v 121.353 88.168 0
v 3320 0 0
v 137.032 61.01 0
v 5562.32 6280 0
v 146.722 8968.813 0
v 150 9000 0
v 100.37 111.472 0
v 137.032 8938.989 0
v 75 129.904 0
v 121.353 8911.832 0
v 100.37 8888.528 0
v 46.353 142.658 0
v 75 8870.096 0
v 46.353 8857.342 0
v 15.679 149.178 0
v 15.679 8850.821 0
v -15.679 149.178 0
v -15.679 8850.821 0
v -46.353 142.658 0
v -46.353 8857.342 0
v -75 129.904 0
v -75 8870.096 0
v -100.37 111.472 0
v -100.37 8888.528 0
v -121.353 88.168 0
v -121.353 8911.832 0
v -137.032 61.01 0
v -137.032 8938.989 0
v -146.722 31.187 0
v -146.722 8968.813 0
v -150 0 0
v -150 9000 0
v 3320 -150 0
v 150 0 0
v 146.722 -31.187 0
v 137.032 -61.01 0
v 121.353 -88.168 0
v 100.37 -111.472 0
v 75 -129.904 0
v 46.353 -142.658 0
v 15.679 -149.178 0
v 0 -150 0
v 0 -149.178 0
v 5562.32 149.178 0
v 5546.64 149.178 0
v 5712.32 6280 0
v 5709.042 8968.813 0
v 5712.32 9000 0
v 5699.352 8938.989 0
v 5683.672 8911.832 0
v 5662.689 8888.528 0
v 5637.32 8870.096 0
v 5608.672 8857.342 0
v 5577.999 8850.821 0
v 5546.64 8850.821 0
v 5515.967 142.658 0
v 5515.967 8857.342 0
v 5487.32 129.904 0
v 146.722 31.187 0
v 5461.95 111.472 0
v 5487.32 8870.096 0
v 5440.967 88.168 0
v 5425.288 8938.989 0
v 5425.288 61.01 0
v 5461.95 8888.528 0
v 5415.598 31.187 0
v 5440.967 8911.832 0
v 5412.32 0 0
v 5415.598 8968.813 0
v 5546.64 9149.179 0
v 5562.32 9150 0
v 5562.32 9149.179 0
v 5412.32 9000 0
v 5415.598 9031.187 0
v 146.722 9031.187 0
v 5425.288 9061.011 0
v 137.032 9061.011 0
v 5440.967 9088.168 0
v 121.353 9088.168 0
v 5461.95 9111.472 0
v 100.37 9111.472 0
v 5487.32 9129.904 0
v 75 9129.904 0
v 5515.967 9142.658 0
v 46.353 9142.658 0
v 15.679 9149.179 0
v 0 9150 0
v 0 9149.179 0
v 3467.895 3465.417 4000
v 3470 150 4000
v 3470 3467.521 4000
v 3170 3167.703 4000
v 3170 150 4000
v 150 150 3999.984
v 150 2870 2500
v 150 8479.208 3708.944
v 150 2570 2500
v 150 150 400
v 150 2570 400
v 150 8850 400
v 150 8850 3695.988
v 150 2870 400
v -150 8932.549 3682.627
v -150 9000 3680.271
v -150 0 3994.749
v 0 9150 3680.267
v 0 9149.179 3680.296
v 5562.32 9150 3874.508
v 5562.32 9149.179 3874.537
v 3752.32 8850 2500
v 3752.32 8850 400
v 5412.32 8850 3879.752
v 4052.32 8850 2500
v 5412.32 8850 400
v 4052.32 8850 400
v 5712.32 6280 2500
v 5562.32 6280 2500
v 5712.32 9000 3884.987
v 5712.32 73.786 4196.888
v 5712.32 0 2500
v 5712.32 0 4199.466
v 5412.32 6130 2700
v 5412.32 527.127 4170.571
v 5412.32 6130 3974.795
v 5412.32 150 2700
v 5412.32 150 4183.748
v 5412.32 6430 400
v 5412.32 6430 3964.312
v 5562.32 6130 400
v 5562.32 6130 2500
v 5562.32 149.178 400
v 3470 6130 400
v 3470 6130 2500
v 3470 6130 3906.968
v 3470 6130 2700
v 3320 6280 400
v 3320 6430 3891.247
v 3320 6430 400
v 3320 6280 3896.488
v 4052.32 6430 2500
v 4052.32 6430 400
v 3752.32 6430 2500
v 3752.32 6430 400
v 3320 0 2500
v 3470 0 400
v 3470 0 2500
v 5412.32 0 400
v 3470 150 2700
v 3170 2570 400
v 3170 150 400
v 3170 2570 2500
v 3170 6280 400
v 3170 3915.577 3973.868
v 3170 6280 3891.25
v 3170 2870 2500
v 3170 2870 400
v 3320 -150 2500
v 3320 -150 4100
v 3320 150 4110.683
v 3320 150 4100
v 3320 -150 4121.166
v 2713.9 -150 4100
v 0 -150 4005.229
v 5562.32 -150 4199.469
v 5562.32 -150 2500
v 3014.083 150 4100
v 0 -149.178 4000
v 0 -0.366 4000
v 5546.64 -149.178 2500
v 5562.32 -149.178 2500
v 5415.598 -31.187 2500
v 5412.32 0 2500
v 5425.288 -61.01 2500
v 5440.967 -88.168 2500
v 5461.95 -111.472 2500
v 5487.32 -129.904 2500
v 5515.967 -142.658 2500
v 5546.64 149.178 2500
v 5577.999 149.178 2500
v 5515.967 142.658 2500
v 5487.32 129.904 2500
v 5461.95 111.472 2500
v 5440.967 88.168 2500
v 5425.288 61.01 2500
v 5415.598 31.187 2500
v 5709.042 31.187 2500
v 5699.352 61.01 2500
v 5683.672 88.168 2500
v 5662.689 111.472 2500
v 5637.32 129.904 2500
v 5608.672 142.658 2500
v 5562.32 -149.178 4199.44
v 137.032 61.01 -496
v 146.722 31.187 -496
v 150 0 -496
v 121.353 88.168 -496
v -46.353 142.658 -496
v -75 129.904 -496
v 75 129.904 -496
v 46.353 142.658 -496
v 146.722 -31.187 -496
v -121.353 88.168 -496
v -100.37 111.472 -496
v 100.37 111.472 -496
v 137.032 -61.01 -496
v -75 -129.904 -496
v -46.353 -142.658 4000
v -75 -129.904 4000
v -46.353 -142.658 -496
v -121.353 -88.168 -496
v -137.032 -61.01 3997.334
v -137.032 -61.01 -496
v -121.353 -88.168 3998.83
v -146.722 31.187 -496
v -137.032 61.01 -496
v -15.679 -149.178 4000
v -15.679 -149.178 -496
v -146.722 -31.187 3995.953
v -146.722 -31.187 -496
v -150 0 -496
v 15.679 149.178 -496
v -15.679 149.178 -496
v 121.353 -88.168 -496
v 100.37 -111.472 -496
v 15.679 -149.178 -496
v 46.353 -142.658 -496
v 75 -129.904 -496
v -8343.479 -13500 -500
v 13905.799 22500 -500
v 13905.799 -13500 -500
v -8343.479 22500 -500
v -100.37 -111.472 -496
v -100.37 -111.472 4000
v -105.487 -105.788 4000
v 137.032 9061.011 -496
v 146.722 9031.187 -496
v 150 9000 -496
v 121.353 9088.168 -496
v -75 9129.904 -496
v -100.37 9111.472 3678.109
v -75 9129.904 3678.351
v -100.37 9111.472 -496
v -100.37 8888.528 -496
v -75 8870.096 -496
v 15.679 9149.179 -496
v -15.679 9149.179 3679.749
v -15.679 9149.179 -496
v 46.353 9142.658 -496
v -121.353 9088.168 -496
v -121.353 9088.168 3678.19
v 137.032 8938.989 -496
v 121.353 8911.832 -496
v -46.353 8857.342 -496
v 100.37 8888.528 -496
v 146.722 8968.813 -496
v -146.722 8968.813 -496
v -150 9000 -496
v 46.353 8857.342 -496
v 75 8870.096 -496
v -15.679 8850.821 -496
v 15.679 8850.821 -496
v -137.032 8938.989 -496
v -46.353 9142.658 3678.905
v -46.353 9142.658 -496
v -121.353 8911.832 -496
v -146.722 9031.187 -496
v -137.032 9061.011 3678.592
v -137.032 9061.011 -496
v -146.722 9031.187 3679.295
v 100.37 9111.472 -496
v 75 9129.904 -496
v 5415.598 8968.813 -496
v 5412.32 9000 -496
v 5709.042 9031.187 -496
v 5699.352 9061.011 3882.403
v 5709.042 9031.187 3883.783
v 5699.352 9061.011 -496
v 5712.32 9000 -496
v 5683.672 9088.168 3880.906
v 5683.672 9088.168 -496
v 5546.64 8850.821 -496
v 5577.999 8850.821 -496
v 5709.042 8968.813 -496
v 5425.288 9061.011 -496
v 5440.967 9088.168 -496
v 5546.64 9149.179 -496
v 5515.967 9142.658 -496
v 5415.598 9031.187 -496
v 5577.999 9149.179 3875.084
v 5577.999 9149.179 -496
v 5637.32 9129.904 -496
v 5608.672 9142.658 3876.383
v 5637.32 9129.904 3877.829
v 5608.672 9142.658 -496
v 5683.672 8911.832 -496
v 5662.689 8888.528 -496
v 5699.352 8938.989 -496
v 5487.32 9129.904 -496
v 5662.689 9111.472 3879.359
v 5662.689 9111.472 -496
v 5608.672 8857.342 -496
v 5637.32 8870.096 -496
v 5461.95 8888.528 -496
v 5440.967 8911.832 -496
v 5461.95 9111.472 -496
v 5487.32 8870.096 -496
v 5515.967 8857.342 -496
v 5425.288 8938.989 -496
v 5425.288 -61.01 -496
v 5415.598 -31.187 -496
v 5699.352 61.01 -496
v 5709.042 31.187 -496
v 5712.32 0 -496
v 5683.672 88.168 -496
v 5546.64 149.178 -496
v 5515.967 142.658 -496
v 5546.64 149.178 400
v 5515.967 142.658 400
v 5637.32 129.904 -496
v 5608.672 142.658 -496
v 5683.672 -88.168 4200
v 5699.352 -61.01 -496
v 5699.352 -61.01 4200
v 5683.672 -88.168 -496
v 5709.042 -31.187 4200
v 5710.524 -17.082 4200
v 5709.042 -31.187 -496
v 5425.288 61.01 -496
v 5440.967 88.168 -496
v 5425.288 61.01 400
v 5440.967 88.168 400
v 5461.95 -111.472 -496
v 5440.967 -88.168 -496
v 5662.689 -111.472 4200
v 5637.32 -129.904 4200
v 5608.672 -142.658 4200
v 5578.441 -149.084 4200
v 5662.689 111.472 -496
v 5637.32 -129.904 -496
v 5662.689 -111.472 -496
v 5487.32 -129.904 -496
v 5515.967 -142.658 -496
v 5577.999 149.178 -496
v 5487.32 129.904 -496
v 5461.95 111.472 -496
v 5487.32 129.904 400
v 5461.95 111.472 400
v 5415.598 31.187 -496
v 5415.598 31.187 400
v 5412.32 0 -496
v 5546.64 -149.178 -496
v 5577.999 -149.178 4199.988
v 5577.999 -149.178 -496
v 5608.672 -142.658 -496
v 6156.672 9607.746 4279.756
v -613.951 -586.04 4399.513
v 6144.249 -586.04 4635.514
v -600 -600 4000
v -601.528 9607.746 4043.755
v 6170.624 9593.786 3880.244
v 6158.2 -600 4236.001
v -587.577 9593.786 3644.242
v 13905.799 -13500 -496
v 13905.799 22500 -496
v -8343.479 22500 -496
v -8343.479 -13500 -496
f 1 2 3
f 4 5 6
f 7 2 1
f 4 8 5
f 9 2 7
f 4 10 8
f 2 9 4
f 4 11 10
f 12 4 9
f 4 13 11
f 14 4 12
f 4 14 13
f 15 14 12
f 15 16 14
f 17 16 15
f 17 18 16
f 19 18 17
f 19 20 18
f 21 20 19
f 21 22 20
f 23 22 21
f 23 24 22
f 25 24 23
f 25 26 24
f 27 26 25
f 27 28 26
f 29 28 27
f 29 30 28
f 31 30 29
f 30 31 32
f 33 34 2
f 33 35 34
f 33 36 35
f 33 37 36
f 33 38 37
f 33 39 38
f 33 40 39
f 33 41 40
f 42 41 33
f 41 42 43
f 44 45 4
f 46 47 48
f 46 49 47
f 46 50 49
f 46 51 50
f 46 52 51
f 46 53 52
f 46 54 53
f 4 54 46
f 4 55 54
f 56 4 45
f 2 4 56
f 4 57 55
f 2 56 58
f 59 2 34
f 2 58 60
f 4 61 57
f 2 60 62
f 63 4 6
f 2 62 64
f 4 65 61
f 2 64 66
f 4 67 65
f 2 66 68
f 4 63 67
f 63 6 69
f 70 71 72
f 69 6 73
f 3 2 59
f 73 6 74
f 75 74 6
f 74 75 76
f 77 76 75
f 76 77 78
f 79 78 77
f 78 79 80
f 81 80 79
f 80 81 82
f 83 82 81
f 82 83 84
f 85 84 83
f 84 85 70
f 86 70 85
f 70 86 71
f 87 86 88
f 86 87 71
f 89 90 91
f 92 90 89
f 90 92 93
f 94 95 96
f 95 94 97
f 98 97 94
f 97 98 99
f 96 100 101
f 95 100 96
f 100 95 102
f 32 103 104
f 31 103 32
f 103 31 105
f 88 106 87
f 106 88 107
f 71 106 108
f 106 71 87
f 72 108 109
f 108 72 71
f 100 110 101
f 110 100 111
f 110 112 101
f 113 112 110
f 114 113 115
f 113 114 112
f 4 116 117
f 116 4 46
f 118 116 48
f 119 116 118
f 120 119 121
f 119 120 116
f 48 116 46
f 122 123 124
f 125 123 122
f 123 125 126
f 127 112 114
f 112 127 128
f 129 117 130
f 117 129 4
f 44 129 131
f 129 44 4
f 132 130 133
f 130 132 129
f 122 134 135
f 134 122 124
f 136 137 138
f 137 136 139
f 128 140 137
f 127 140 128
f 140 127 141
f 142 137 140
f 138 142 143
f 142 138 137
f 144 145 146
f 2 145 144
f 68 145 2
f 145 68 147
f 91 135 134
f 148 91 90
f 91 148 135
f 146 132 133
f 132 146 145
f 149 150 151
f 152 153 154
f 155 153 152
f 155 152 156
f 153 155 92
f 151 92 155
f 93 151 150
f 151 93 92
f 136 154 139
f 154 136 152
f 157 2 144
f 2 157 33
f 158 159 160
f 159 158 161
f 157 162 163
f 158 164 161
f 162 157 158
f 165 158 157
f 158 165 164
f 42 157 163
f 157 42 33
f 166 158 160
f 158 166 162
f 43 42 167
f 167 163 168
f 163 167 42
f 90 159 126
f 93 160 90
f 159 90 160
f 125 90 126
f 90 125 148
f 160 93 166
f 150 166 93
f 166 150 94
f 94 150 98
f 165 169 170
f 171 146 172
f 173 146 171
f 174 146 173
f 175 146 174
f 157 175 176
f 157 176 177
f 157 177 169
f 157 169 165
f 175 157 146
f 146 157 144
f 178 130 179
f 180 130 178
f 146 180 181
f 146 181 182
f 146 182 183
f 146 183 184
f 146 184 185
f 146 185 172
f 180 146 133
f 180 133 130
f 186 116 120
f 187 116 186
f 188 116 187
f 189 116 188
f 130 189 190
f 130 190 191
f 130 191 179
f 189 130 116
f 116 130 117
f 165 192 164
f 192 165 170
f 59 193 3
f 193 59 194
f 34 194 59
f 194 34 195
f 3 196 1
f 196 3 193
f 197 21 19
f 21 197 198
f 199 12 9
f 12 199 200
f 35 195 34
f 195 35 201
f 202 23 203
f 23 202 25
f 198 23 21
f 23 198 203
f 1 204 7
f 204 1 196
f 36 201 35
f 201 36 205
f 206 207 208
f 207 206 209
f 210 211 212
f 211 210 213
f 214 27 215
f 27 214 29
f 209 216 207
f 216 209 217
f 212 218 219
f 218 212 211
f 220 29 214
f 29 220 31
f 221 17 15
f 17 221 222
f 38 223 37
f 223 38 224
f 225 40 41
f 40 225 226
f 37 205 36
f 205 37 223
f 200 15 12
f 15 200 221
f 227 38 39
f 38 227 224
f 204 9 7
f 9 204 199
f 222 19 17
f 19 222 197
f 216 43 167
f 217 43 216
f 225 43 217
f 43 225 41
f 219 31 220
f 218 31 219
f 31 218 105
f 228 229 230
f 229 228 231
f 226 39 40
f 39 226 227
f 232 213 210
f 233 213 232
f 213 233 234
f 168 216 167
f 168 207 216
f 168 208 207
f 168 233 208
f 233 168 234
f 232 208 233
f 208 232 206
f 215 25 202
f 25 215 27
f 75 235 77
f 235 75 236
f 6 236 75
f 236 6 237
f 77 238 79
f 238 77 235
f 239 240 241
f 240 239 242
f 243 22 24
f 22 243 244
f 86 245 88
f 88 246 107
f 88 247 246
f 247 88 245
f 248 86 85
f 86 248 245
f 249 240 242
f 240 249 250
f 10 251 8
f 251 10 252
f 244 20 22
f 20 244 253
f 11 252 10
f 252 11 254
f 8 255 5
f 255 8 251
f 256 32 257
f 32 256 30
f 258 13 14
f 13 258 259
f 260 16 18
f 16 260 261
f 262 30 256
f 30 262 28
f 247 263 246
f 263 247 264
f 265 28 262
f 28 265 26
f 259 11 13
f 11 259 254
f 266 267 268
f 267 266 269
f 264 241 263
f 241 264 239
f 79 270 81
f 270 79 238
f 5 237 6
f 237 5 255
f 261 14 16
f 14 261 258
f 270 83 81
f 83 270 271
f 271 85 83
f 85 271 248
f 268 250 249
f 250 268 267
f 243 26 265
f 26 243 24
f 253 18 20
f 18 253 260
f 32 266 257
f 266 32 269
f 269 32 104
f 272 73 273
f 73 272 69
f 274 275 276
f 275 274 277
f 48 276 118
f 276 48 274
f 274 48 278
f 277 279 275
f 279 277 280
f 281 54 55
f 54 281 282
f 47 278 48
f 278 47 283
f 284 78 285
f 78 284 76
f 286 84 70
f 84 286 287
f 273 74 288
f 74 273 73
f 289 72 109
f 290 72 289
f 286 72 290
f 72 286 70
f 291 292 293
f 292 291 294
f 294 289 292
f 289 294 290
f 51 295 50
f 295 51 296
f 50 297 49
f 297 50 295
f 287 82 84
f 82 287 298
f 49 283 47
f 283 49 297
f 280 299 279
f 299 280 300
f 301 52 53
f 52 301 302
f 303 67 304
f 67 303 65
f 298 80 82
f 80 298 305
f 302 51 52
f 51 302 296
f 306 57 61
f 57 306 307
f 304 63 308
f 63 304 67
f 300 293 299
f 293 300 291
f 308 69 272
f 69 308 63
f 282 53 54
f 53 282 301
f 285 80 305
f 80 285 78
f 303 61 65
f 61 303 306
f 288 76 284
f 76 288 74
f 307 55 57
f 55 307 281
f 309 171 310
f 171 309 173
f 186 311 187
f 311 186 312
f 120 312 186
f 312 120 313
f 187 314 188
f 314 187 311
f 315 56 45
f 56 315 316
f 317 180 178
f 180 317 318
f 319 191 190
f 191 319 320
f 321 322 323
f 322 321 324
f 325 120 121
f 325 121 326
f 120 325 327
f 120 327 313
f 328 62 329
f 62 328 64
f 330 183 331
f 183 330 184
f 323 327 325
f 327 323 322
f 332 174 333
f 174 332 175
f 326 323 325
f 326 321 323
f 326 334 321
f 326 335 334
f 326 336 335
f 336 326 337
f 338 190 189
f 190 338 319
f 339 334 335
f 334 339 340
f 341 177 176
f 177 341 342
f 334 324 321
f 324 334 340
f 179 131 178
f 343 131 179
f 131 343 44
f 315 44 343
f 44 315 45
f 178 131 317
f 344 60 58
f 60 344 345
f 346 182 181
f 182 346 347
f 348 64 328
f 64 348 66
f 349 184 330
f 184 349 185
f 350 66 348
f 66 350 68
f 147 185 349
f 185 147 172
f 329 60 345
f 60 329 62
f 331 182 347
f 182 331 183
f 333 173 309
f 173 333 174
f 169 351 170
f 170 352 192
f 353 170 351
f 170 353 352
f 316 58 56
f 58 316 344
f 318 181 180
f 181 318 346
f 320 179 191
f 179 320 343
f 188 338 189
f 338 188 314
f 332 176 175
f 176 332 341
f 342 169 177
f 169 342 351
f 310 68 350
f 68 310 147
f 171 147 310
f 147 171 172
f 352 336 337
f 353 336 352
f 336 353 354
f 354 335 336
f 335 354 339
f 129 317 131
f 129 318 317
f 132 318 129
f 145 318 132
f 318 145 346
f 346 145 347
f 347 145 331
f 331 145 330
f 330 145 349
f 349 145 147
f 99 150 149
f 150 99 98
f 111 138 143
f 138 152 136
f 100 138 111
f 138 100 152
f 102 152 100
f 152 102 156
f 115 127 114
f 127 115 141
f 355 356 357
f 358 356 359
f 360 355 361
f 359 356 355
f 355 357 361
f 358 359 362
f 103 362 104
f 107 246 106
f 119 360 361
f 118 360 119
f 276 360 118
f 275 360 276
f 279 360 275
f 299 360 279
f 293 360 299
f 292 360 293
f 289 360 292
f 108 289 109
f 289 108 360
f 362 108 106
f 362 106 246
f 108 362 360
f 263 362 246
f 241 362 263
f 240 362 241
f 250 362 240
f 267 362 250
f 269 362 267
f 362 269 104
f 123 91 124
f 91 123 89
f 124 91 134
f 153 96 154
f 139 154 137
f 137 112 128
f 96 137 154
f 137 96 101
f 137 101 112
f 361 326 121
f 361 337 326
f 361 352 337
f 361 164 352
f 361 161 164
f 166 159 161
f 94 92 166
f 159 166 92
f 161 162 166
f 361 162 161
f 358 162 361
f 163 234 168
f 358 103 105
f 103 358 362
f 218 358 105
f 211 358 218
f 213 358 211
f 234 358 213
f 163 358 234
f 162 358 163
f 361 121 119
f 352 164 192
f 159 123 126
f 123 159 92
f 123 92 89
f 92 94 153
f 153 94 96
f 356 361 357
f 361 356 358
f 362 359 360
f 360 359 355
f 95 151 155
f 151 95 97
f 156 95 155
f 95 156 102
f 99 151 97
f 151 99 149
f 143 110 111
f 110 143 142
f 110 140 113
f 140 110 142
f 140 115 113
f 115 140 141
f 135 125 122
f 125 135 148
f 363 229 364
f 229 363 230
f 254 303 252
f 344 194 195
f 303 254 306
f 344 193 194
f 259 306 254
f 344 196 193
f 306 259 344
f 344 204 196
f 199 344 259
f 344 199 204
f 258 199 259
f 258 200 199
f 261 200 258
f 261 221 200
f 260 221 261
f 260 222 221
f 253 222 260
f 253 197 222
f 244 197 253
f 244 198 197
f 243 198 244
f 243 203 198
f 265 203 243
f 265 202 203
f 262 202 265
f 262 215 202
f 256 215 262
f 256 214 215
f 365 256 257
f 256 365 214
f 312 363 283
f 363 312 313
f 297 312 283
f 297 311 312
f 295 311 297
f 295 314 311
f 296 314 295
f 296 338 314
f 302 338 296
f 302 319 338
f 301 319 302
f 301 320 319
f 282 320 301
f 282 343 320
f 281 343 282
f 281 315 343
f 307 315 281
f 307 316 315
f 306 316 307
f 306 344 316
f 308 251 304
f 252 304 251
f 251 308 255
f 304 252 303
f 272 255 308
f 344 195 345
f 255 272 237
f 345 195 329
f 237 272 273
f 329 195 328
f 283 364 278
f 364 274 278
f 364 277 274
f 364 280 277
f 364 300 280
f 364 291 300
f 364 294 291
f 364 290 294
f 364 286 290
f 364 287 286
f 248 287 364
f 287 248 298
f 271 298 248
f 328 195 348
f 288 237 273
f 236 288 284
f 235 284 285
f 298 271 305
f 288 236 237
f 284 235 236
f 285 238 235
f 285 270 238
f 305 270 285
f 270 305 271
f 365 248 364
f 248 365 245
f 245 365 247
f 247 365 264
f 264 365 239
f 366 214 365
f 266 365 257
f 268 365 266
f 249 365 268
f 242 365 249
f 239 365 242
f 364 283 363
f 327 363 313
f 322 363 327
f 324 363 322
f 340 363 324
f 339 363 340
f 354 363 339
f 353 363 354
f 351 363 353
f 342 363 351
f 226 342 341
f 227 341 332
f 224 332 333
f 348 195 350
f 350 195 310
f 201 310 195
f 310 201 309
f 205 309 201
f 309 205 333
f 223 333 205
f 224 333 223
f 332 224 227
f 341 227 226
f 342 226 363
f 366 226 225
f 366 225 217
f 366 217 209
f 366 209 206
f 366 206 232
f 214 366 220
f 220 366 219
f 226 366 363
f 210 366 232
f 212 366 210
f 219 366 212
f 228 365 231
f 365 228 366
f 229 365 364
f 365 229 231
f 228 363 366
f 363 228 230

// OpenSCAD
// file: element.scad
// constants
gr = 1.61803; // golden ration

// calculate the coordinates for the corners
function point(i, r, corners) =
   let (vz = 360/corners/2)
   let (angle=i*(360/corners) - vz)
   [ r*cos(angle)
   , r*sin(angle)
   ];

function inbetween(p1, p2, procent) =
    let (x_diff = p2[0] - p1[0])
    let (y_diff = p2[1] - p1[1])
    [ p1[0] + x_diff*procent/100
    , p1[1] + y_diff*procent/100
    ];

module glas_color() {
    color("lightblue")
    children();
}

// create a wall
module wall(p1, p2, h, thickness = 300) {
    let (x_diff = p2[0] - p1[0])
    let (y_diff = p2[1] - p1[1])
    let (len = sqrt(pow(x_diff, 2) +
                    pow(y_diff, 2)))
    linear_extrude(height = h)
    translate(p1)
    rotate(atan2(y_diff, x_diff))
    translate([0, -thickness/2])
    square([len, thickness]);
}

module octagon(r, h, corners) {
    coords=[for (i = [0:corners-1]) point(i, r, corners)];
    linear_extrude(height = h)
    polygon(coords);
}

module octawalls(r, h, wt, corners) {
    difference () {
        octagon(r, h, corners);
        translate([0, 0, -wt])
        octagon(r - wt, h + 2*wt, corners);
    }
}

module window(p1, p2, pos, height, sizex, sizey, wt = 300) {
    assert(0 < pos && pos < 100);
    x_diff = p2[0] - p1[0];
    y_diff = p2[1] - p1[1];
    len = sqrt(pow(x_diff, 2) +
               pow(y_diff, 2));
    difference () {
        children();
        // create the hole for the window
        translate([0,0,height])
        translate(p1 + pos*[x_diff, y_diff]/100)
        rotate(atan2(y_diff, x_diff) + 90, [0,0,1])
        cube([4*wt, sizex, sizey], center = true);
    }
    // add the glass to the window
    glas_color()
    translate([0,0,height])
    translate(p1 + pos*[x_diff, y_diff]/100)
    rotate(atan2(y_diff, x_diff) + 90, [0,0,1])
    translate([wt/2, 0, 0])
    cube([wt/2, sizex, sizey], center = true);
}
// main file
include <element.scad>

// configure the rendering
show_floor = true;
show_roof = true;

// configure the house

// bathroom
bath_l = 2720;
bath_w = 1660;

// bedroom
bed_l = 3320;
bed_w = 2720;

// outer size
house_l = 9000; // house length
house_w = house_l/gr; // house width
house_h = 4000; // house height
oh = 600; // over-hang of the roof
log_d = 300; // log diameter

// winter garden
ww = house_w - bed_l; // winter-garden width
wl = house_l - bath_l; // winter-garden length

function w_area() =
    ww*wl/999999;
function area() =
    house_l*house_w/1000000 - w_area();

echo("long side = ", house_l/1000);
echo("short side = ", house_w/1000);
echo("area = ", area());
echo("area winter-garden= ", w_area());

module win(p1, p2, pos, height, sizex, sizey, wt = 300) {
    window(p1, p2, pos, height, sizex, sizey, wt)
    children();
}

// Points
c1 = [0, 0];
c2 = [0, house_l];
c3 = [house_w, house_l];
c4 = [house_w, 0];
w1 = c4 + [0, wl];
w2 = [house_w - ww, wl];
w3 = [house_w - ww, 0];

// Lawn
color("LawnGreen")
translate([-1.5*house_w, -1.5*house_l, -500])
cube([4*house_w, 4*house_l, 4]);

module hus() {
    // Floor
    cube([house_w, house_l, 400]);

    // Roof
    if (show_roof) {
        translate([-oh, -oh, house_h])
        rotate([-2, -2, 0])
        cube([house_w + 2*oh, house_l + 2*oh, 400]);
    }

    // Windows

    // Outer walls
    color("MediumSpringGreen")
    union() {
        wall(c1, c2, house_h);
        wall(c2, c3, house_h);
        wall(c3, w1, house_h);
        wall(w1, w2, house_h);
        wall(w2, w3, house_h);
        wall(w3, c1, house_h + 100);
        // Loft
        translate([0, 0, 2500]) wall(w1, c4, 1700);
        translate([0, 0, 2500]) wall(c4, w3, 1700);
    }

    // Pillars
    color("Ivory")
    union() {
        translate([0, 0, -500]) cylinder(h = house_h + 500, d = log_d);
        translate([0, house_l, -500]) cylinder(h = house_h + 500, d = log_d);
        translate([house_w, house_l, -500]) cylinder(h = house_h + 500, d = log_d);
        translate([house_w, 0, -500]) cylinder(h = house_h + 500 + 200, d = log_d);
    }

    // Inner walls
    translate([0, bed_w, 0]) wall(c1, w3, 2500); // bed room
    translate([-bath_w, 0, 0]) wall(c3, w1, 2500); // bath room

    // Wintergarden roof
    translate([bed_l, 0, 2500]) cube([ww, wl, 200]);
}

hus();
